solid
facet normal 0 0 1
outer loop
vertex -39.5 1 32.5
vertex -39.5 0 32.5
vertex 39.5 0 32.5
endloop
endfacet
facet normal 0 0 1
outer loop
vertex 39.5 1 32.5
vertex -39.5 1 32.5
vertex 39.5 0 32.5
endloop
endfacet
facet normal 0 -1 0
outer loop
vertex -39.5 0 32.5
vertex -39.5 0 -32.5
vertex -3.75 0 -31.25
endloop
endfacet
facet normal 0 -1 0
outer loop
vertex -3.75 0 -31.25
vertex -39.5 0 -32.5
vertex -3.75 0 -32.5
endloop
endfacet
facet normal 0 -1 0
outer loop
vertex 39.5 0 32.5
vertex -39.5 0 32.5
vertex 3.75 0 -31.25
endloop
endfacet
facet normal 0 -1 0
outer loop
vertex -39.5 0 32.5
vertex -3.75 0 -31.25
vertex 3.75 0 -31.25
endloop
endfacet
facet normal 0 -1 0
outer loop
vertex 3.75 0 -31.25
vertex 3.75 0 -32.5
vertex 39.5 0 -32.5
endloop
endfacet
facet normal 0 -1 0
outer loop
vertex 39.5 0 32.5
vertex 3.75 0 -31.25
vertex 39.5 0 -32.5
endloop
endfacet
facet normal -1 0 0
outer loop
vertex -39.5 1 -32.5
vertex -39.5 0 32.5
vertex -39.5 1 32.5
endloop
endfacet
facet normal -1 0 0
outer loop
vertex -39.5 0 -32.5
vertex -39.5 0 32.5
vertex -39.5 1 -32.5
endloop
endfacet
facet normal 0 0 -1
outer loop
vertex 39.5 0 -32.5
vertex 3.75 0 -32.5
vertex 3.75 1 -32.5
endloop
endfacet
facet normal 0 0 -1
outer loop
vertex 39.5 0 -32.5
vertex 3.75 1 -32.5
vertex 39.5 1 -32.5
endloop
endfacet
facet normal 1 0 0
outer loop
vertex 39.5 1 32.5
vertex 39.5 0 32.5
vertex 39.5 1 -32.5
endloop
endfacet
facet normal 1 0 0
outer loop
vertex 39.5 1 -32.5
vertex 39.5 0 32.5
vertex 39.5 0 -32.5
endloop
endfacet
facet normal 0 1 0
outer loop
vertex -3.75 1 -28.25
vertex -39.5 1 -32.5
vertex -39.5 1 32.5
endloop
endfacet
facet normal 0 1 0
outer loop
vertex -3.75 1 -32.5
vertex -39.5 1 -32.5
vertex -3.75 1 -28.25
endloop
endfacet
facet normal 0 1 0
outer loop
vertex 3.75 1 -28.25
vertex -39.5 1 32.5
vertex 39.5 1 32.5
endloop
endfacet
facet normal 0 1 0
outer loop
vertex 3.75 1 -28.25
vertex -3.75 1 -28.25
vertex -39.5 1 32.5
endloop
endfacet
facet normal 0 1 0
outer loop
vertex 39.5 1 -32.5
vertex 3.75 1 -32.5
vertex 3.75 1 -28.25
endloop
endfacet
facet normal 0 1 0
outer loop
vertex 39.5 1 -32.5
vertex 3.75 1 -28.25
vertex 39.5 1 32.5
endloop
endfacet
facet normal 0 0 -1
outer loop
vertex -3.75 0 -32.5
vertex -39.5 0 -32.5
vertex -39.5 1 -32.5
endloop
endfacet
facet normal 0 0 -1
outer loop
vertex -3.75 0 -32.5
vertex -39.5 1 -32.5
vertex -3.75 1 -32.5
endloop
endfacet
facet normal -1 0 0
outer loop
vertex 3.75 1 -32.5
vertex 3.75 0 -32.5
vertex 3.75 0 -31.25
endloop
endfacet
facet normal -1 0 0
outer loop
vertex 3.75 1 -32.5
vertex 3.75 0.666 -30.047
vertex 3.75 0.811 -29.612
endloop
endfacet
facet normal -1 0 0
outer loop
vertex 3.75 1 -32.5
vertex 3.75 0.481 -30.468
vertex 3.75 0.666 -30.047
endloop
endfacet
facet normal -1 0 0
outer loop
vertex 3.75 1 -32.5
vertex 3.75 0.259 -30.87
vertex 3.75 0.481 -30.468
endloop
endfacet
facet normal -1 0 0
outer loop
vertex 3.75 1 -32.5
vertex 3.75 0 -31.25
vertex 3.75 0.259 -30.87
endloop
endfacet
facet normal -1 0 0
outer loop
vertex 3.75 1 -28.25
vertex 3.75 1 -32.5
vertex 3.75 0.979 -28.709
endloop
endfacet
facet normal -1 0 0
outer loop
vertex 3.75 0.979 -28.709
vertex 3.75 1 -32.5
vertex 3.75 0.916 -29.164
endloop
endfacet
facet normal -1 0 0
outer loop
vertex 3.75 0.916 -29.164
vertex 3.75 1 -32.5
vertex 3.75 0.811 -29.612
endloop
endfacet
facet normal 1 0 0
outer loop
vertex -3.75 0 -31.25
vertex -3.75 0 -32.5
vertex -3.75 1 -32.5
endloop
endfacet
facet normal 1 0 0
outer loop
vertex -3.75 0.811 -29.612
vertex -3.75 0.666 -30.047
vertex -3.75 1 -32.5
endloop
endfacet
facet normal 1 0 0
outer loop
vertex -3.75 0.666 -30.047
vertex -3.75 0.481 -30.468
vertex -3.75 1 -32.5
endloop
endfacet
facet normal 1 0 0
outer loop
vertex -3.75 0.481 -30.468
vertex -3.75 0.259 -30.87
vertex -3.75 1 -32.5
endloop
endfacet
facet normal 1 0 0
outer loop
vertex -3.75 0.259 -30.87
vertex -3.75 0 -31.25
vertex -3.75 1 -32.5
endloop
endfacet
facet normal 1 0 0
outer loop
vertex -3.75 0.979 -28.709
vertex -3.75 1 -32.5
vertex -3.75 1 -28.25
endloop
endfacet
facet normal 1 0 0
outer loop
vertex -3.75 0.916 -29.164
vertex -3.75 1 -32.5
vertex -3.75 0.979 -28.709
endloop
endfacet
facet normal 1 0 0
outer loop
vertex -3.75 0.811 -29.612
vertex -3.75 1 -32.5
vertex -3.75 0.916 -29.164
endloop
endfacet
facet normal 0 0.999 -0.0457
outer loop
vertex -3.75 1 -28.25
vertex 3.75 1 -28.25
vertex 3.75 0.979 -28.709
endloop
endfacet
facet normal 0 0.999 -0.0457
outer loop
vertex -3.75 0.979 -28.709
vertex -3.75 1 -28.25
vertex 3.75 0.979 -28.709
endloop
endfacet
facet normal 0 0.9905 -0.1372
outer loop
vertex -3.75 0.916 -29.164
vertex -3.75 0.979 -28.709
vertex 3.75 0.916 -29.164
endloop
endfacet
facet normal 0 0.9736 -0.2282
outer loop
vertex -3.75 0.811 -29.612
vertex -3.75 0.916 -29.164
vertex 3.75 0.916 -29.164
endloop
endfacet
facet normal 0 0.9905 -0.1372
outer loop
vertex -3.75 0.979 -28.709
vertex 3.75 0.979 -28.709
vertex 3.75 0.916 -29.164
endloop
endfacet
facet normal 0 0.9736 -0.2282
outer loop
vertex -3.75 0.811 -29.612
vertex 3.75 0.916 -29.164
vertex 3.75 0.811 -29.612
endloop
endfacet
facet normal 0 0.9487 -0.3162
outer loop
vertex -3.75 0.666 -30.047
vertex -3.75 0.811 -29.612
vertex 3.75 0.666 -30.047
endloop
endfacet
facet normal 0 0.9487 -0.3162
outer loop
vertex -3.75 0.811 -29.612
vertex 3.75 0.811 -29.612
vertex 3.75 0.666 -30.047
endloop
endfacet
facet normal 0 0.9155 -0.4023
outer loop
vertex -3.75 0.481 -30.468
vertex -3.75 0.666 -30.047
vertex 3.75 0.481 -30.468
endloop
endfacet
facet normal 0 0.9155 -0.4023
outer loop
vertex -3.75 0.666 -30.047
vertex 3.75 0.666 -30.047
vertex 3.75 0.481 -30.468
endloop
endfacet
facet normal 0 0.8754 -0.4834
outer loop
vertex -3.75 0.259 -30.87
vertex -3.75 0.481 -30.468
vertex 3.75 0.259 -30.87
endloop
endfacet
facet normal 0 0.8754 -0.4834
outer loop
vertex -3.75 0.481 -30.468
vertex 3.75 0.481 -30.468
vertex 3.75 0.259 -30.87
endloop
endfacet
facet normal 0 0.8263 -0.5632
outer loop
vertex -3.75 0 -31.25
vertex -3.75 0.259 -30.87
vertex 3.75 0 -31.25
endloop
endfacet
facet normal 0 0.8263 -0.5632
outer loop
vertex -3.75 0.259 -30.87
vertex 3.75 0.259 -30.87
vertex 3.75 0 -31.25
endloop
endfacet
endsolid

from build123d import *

# Parameters (mm, degrees)
ESQUISSE1_W             = 79
ESQUISSE1_H             = 65
BOSS_EXTRU_1_DEPTH      = 1
ESQUISSE3_W             = 7.5
ESQUISSE3_H             = 7.5
ENL_V_MAT_EXTRU_1_DEPTH = 1.25
CONG_1_R                = 5


with BuildPart() as part:
    # Esquisse1 → Boss.-Extru.1 (new body)
    with BuildSketch(Plane(origin=(0, 0, 0), x_dir=(1, 0, 0), z_dir=(0, 1, 0))):
        Rectangle(ESQUISSE1_W, ESQUISSE1_H)
    extrude(amount=BOSS_EXTRU_1_DEPTH)

    # Esquisse3 → Enlèv. mat.-Extru.1 (cut)
    with BuildSketch(Plane(origin=(0, 0, -32.5), x_dir=(-1, 0, 0), z_dir=(0, 0, -1))):
        with Locations((0, 0.5)):
            Rectangle(ESQUISSE3_W, ESQUISSE3_H)
    extrude(amount=-ENL_V_MAT_EXTRU_1_DEPTH, mode=Mode.SUBTRACT)

    # Congé1
    # the kernel refuses this fillet: 5 mm, written as the material it takes off along each edge
    with BuildSketch(Plane(origin=(3.75, 1, -31.25), x_dir=(0, 0, 1), z_dir=(-1, 0, 0))) as cong_1_piece_1:
        with BuildLine():
            CenterArc((3, -5), CONG_1_R, 90, 36.869897646)
            Line((0, -1), (-0.06, -0.92))
            ThreePointArc((-0.06, -0.92), (-0.1, -0.5), (-0.1, 0))
            Line((-0.1, 0), (0, 0.1))
            Line((0, 0.1), (3, 0.1))
            Line((3, 0.1), (3, 0))
        make_face()
    extrude(amount=7.5, mode=Mode.SUBTRACT)


solid = part.part
